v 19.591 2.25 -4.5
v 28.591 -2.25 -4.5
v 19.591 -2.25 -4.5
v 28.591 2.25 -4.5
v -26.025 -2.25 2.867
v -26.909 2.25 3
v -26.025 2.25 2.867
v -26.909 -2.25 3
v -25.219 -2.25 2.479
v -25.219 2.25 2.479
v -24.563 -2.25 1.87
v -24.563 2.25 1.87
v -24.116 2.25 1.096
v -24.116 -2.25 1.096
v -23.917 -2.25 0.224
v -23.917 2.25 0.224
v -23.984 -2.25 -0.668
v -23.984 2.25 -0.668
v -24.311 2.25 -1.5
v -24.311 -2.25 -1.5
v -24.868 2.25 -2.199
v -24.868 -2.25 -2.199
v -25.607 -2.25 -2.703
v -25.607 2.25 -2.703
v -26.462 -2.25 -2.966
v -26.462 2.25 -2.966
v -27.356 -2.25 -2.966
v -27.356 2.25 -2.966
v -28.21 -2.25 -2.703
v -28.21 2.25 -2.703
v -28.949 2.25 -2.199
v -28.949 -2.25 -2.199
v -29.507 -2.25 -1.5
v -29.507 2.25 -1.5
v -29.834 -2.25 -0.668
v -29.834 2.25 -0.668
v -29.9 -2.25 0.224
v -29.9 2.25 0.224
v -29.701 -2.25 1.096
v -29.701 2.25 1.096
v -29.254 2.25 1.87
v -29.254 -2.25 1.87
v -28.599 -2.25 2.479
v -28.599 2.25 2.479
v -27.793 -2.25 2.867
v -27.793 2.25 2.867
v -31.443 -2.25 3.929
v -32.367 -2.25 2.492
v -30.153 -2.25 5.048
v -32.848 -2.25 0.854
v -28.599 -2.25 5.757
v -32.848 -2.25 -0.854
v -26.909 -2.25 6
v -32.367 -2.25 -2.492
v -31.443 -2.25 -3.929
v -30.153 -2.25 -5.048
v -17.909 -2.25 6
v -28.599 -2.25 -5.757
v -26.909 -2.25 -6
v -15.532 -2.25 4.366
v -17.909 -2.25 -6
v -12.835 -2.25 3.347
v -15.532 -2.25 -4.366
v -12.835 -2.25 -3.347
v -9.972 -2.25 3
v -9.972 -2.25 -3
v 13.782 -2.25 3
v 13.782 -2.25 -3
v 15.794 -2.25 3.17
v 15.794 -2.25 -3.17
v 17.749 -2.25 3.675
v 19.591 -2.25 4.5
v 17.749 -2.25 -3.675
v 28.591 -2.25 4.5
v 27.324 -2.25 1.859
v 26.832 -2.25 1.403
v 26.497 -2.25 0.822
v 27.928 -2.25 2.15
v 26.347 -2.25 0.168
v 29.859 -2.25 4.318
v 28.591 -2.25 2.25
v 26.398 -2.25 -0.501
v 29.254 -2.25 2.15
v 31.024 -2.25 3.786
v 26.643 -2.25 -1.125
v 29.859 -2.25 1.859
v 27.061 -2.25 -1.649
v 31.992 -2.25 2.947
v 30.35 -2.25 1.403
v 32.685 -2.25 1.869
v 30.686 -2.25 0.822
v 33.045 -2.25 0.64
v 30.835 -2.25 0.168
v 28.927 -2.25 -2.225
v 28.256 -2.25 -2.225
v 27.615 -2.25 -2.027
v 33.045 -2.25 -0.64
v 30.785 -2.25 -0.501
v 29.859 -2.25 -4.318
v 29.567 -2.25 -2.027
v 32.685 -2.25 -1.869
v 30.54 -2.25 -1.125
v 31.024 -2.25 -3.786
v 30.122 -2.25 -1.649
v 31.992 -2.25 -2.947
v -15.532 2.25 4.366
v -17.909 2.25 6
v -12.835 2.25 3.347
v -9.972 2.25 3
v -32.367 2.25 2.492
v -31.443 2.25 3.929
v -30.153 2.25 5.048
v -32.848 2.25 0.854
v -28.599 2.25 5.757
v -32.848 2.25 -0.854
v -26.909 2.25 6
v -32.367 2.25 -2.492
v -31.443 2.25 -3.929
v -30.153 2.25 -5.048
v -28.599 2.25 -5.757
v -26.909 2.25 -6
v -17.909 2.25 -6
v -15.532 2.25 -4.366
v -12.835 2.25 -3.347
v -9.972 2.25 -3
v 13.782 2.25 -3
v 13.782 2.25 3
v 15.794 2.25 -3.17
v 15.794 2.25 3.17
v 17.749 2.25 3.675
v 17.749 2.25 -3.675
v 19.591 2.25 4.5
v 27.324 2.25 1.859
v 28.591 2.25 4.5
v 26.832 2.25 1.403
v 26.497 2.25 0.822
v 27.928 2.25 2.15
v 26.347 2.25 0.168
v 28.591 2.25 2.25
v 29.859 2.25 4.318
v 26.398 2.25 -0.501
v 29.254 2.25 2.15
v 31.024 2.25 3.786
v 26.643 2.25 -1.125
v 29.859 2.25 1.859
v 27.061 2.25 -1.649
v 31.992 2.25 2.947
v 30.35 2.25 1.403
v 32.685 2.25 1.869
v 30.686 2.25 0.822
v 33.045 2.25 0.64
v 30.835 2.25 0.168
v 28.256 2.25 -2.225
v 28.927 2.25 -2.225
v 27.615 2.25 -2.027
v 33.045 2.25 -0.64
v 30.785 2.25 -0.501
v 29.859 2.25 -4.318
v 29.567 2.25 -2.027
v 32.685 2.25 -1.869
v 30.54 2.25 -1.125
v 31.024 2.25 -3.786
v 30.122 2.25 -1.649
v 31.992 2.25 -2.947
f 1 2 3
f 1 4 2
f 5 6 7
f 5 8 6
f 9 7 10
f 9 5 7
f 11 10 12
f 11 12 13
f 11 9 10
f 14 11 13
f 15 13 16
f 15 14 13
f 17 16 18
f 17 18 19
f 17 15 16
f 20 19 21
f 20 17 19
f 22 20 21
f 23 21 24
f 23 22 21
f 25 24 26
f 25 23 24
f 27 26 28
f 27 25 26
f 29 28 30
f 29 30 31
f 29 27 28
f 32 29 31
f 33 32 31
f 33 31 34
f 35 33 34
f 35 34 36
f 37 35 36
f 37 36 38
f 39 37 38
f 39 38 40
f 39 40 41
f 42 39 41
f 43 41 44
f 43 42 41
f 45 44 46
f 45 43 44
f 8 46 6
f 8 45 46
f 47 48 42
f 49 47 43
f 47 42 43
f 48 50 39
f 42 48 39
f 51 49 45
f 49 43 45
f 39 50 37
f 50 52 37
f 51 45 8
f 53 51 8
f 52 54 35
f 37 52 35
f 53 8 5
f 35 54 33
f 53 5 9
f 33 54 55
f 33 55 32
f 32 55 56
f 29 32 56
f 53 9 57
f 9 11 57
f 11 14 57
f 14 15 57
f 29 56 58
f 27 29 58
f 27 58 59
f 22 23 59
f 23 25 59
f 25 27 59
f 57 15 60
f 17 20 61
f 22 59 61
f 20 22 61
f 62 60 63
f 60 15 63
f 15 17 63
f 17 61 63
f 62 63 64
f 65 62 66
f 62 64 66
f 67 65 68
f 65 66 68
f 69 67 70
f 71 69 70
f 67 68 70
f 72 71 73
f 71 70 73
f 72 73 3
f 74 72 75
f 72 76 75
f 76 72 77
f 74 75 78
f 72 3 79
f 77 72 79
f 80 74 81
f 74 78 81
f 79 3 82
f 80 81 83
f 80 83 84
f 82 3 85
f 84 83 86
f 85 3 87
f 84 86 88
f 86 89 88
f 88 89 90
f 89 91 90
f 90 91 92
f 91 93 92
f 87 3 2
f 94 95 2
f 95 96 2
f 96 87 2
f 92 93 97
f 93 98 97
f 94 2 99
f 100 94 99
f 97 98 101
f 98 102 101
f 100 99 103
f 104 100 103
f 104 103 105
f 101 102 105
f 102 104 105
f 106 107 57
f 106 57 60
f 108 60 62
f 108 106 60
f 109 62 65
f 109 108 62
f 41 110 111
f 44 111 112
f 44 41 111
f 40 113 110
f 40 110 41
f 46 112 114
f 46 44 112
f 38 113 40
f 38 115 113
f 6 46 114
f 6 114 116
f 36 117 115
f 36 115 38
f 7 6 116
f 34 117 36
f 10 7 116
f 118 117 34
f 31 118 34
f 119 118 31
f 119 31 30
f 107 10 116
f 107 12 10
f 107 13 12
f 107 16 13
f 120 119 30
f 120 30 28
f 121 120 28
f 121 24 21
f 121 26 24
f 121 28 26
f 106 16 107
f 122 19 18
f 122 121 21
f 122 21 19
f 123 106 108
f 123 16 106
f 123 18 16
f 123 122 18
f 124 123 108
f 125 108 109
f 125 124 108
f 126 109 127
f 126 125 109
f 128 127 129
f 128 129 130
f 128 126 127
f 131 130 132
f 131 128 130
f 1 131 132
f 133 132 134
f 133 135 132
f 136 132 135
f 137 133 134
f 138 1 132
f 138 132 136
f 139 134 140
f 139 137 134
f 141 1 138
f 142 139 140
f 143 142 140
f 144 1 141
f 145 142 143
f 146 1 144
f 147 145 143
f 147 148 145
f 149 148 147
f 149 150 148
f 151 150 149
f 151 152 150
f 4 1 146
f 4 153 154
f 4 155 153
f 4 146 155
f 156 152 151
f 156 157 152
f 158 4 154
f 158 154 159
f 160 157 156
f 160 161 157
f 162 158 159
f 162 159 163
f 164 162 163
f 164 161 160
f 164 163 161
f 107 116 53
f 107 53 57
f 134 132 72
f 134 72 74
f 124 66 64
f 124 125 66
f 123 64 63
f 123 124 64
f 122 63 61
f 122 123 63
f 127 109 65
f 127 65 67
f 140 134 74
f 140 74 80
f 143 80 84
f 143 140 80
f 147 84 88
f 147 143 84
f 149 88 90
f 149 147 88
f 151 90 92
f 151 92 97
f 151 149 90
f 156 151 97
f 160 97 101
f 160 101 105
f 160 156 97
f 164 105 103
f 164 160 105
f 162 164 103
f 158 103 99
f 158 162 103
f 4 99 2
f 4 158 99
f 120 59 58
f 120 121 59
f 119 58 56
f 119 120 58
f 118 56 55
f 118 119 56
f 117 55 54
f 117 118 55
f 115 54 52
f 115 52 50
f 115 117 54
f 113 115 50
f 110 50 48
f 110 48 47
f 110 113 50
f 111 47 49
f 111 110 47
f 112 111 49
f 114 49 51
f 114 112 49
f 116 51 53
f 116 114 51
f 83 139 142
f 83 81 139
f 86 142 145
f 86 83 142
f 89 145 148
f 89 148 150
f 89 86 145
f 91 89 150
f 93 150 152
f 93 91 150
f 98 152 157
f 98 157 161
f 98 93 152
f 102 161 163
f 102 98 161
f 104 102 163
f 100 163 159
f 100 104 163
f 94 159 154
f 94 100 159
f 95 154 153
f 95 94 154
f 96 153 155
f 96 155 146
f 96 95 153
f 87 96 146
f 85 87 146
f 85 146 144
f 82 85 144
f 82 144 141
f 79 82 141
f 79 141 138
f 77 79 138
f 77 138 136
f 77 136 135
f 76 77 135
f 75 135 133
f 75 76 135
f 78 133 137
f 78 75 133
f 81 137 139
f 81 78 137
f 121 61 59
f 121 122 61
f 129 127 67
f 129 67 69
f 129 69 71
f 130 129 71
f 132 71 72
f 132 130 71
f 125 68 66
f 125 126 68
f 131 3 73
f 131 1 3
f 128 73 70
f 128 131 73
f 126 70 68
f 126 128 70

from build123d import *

# Parameters (mm, degrees)
SKETCH1_R           = 2
SKETCH1_R_2         = 1.5
BOSS_EXTRUDE1_DEPTH = 1.5
SCALE1_SCALE        = 1.5


with BuildPart() as part:
    # Sketch1 → Boss-Extrude1 (new, symmetric)
    with BuildSketch(Plane(origin=(0, 0, 0), x_dir=(1, 0, 0), z_dir=(0, 1, 0))):
        with BuildLine():
            ThreePointArc((-18.5, 4), (-22.5, 0), (-18.5, -4))
            Line((-18.5, -4), (-12.5, -4))
            ThreePointArc((-12.5, -4), (-10.036924503, -2.516685226), (-7.208497378, -2))
            Line((-7.208497378, -2), (8.627016654, -2))
            ThreePointArc((8.627016654, -2), (10.627016654, -2.254033308), (12.5, -3))
            Line((12.5, -3), (18.5, -3))
            ThreePointArc((18.5, -3), (21.5, 0), (18.5, 3))
            Line((18.5, 3), (12.5, 3))
            ThreePointArc((12.5, 3), (10.627016654, 2.254033308), (8.627016654, 2))
            Line((8.627016654, 2), (-7.208497378, 2))
            ThreePointArc((-7.208497378, 2), (-10.036924503, 2.516685226), (-12.5, 4))
            Line((-12.5, 4), (-18.5, 4))
        make_face()
        with Locations(Location((-18.5, 0, 0), (0, 0, 270))):
            Circle(SKETCH1_R, mode=Mode.SUBTRACT)
        with Locations(Location((18.5, 0, 0), (0, 0, 270))):
            Circle(SKETCH1_R_2, mode=Mode.SUBTRACT)
    extrude(amount=BOSS_EXTRUDE1_DEPTH, both=True)


with BuildPart() as part_1:
    # Scale1: scaled about (-1.682409561, 0, 0)
    add(part.part.scale(SCALE1_SCALE).moved(Location((0.841204781, 0, 0))))


solid = part_1.part
